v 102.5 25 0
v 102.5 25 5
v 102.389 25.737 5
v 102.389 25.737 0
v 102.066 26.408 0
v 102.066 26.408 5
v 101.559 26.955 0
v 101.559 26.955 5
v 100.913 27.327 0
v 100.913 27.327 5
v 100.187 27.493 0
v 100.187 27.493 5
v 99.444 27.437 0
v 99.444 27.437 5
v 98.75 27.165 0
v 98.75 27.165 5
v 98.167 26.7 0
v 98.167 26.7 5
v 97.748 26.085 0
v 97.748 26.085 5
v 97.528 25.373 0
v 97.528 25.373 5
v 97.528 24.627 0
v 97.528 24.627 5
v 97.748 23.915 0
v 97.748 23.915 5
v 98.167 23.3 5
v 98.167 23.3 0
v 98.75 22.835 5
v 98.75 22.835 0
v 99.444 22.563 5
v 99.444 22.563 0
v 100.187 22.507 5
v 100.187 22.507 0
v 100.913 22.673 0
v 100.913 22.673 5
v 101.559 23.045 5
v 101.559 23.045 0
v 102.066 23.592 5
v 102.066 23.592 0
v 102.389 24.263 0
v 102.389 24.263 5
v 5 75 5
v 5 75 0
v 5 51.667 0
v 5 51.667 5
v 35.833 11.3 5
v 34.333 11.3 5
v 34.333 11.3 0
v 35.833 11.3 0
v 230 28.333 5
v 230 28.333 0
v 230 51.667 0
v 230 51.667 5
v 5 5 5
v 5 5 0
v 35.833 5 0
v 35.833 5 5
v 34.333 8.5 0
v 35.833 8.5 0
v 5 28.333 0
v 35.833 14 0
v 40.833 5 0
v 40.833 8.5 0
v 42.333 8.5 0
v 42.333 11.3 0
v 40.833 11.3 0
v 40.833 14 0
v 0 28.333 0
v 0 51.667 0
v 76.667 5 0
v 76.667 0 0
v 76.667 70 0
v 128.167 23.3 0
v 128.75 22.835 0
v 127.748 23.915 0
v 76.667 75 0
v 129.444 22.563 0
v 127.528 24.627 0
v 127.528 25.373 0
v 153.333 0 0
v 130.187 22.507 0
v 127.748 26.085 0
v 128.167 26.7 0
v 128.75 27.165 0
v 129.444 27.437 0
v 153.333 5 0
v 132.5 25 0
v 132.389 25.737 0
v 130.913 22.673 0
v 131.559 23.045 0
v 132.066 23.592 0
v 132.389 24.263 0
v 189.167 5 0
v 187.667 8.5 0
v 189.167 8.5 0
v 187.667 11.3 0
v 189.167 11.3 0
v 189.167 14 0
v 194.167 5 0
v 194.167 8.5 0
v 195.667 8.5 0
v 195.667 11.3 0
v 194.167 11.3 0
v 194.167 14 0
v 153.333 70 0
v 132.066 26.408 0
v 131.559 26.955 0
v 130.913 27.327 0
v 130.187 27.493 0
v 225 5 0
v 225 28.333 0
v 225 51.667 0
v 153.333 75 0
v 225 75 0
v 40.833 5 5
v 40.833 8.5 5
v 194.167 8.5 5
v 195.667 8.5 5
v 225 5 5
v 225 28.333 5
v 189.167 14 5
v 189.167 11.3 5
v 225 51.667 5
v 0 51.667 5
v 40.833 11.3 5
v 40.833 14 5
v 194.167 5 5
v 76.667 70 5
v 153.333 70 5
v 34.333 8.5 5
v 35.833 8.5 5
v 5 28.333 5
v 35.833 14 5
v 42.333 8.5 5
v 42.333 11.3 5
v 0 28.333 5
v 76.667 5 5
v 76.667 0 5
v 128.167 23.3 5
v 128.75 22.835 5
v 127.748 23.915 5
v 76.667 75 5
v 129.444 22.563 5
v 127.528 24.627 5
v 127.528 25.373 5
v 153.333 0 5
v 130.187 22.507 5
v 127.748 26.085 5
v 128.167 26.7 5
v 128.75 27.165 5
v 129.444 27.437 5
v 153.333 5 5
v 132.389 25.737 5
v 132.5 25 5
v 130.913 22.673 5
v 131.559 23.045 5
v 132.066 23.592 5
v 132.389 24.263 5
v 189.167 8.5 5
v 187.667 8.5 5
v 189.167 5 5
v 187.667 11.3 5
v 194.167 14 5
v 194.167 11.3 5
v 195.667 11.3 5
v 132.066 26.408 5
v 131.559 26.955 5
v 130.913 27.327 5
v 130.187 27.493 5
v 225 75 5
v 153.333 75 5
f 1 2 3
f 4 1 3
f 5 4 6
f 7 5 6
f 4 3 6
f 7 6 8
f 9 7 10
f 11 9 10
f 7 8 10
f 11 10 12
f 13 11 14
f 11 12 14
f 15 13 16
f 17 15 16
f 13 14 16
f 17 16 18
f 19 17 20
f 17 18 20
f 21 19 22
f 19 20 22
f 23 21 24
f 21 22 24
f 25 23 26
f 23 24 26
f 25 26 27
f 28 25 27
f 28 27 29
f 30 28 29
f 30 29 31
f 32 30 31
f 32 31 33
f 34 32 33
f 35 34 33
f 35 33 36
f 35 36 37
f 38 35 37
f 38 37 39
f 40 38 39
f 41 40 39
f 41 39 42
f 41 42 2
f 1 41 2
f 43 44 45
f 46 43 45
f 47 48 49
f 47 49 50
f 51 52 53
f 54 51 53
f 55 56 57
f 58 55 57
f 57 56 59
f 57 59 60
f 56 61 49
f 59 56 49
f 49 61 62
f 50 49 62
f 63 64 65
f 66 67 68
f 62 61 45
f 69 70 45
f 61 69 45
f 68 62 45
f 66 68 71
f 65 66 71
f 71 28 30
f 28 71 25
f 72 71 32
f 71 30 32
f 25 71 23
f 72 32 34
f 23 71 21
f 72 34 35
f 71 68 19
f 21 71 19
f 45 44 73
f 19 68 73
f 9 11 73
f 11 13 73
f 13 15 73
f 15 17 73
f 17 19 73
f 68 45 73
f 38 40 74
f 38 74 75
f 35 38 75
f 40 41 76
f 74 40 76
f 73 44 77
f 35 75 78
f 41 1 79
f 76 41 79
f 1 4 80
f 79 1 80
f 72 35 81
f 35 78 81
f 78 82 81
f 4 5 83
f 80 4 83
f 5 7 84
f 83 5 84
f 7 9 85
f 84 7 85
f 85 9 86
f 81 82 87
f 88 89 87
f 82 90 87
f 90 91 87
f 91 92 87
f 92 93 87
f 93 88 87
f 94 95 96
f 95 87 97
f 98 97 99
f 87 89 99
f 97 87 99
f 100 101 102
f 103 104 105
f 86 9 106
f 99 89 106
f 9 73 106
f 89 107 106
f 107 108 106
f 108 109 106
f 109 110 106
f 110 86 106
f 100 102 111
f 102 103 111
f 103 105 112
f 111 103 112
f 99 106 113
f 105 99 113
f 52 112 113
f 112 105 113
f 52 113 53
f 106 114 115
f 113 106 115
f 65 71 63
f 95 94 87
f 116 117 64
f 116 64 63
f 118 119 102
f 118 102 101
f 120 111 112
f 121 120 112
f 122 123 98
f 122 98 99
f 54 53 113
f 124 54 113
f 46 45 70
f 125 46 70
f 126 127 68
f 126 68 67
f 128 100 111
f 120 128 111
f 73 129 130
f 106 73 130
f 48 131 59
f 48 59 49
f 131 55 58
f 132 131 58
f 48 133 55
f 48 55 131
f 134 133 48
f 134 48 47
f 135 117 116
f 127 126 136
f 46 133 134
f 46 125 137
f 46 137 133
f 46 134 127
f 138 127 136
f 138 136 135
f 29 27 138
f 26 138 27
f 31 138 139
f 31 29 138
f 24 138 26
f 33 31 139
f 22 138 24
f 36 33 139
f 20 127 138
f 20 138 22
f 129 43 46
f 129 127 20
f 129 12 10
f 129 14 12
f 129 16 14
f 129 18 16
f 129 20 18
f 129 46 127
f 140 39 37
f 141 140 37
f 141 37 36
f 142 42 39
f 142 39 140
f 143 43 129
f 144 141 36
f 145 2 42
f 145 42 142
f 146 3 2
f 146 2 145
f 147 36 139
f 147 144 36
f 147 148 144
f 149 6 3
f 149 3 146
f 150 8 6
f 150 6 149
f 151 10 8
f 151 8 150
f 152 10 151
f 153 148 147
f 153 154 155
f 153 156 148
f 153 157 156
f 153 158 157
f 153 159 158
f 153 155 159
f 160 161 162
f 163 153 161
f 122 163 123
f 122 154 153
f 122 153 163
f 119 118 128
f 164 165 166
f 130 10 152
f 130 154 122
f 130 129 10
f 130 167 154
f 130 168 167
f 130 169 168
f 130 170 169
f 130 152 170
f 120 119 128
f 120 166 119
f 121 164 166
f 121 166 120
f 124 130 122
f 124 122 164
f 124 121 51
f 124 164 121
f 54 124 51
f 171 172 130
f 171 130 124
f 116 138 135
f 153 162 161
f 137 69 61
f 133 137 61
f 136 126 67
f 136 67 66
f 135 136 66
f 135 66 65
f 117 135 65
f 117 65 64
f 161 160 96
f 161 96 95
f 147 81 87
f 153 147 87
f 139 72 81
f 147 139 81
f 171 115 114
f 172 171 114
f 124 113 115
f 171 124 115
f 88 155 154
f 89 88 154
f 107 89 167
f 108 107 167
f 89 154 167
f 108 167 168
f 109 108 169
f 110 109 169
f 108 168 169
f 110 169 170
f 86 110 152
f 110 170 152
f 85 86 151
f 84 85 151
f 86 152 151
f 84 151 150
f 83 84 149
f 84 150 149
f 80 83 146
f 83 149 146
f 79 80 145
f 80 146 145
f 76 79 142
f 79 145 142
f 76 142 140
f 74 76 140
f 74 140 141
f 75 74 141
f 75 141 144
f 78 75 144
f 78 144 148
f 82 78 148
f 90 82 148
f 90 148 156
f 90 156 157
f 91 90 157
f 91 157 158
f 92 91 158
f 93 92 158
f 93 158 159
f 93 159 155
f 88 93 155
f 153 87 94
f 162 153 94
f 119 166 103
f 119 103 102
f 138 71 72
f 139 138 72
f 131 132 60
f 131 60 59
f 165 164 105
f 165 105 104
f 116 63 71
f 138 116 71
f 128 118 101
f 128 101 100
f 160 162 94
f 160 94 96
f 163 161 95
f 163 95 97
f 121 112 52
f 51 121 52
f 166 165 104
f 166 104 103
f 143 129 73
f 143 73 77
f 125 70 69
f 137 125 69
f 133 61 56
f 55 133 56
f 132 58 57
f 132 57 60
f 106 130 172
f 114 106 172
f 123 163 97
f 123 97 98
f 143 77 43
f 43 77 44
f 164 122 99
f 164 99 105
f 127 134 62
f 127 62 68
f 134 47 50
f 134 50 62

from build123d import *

# Parameters (mm, degrees)
SALIENTE_EXTRUIR1_DEPTH = 5
CORTAR_EXTRUIR1_DEPTH   = 5
CROQUIS3_W              = 76.666666666
CROQUIS3_H              = 5
CORTAR_EXTRUIR2_DEPTH   = 10
CROQUIS4_R              = 2.5
CORTAR_EXTRUIR3_DEPTH   = 10


with BuildPart() as part:
    # Croquis1 → Saliente-Extruir1 (new body)
    with BuildSketch(Plane.XY):
        Polygon((76.666666667, 5), (76.666666667, 0), (153.333333333, 0), (153.333333333, 5), (225, 5), (225, 28.333333333), (230, 28.333333333), (230, 51.666666667), (225, 51.666666667), (225, 75), (5, 75), (5, 51.666666667), (0, 51.666666667), (0, 28.333333333), (5, 28.333333333), (5, 5), align=None)
    extrude(amount=SALIENTE_EXTRUIR1_DEPTH)

    # Croquis2 → Cortar-Extruir1 (cut)
    with BuildSketch(Plane.XY.offset(5)):
        Polygon((35.833333333, 5), (35.833333333, 8.5), (34.333333333, 8.5), (34.333333333, 11.3), (35.833333333, 11.3), (35.833333333, 14), (40.833333333, 14), (40.833333333, 11.3), (42.333333333, 11.3), (42.333333333, 8.5), (40.833333333, 8.5), (40.833333333, 5), align=None)
        Polygon((189.166666667, 5), (189.166666667, 8.5), (187.666666667, 8.5), (187.666666667, 11.3), (189.166666667, 11.3), (189.166666667, 14), (194.166666667, 14), (194.166666667, 11.3), (195.666666667, 11.3), (195.666666667, 8.5), (194.166666667, 8.5), (194.166666667, 5), align=None)
    extrude(amount=-CORTAR_EXTRUIR1_DEPTH, mode=Mode.SUBTRACT)

    # Croquis3 → Cortar-Extruir2 (cut)
    with BuildSketch(Plane.XY.offset(5)):
        with Locations((115, 72.5)):
            Rectangle(CROQUIS3_W, CROQUIS3_H)
    extrude(amount=-CORTAR_EXTRUIR2_DEPTH, mode=Mode.SUBTRACT)

    # Croquis4 → Cortar-Extruir3 (cut)
    with BuildSketch(Plane.XY.offset(5)):
        with Locations((100, 25)):
            Circle(CROQUIS4_R)
        with Locations((130, 25)):
            Circle(CROQUIS4_R)
    extrude(amount=-CORTAR_EXTRUIR3_DEPTH, mode=Mode.SUBTRACT)


solid = part.part
